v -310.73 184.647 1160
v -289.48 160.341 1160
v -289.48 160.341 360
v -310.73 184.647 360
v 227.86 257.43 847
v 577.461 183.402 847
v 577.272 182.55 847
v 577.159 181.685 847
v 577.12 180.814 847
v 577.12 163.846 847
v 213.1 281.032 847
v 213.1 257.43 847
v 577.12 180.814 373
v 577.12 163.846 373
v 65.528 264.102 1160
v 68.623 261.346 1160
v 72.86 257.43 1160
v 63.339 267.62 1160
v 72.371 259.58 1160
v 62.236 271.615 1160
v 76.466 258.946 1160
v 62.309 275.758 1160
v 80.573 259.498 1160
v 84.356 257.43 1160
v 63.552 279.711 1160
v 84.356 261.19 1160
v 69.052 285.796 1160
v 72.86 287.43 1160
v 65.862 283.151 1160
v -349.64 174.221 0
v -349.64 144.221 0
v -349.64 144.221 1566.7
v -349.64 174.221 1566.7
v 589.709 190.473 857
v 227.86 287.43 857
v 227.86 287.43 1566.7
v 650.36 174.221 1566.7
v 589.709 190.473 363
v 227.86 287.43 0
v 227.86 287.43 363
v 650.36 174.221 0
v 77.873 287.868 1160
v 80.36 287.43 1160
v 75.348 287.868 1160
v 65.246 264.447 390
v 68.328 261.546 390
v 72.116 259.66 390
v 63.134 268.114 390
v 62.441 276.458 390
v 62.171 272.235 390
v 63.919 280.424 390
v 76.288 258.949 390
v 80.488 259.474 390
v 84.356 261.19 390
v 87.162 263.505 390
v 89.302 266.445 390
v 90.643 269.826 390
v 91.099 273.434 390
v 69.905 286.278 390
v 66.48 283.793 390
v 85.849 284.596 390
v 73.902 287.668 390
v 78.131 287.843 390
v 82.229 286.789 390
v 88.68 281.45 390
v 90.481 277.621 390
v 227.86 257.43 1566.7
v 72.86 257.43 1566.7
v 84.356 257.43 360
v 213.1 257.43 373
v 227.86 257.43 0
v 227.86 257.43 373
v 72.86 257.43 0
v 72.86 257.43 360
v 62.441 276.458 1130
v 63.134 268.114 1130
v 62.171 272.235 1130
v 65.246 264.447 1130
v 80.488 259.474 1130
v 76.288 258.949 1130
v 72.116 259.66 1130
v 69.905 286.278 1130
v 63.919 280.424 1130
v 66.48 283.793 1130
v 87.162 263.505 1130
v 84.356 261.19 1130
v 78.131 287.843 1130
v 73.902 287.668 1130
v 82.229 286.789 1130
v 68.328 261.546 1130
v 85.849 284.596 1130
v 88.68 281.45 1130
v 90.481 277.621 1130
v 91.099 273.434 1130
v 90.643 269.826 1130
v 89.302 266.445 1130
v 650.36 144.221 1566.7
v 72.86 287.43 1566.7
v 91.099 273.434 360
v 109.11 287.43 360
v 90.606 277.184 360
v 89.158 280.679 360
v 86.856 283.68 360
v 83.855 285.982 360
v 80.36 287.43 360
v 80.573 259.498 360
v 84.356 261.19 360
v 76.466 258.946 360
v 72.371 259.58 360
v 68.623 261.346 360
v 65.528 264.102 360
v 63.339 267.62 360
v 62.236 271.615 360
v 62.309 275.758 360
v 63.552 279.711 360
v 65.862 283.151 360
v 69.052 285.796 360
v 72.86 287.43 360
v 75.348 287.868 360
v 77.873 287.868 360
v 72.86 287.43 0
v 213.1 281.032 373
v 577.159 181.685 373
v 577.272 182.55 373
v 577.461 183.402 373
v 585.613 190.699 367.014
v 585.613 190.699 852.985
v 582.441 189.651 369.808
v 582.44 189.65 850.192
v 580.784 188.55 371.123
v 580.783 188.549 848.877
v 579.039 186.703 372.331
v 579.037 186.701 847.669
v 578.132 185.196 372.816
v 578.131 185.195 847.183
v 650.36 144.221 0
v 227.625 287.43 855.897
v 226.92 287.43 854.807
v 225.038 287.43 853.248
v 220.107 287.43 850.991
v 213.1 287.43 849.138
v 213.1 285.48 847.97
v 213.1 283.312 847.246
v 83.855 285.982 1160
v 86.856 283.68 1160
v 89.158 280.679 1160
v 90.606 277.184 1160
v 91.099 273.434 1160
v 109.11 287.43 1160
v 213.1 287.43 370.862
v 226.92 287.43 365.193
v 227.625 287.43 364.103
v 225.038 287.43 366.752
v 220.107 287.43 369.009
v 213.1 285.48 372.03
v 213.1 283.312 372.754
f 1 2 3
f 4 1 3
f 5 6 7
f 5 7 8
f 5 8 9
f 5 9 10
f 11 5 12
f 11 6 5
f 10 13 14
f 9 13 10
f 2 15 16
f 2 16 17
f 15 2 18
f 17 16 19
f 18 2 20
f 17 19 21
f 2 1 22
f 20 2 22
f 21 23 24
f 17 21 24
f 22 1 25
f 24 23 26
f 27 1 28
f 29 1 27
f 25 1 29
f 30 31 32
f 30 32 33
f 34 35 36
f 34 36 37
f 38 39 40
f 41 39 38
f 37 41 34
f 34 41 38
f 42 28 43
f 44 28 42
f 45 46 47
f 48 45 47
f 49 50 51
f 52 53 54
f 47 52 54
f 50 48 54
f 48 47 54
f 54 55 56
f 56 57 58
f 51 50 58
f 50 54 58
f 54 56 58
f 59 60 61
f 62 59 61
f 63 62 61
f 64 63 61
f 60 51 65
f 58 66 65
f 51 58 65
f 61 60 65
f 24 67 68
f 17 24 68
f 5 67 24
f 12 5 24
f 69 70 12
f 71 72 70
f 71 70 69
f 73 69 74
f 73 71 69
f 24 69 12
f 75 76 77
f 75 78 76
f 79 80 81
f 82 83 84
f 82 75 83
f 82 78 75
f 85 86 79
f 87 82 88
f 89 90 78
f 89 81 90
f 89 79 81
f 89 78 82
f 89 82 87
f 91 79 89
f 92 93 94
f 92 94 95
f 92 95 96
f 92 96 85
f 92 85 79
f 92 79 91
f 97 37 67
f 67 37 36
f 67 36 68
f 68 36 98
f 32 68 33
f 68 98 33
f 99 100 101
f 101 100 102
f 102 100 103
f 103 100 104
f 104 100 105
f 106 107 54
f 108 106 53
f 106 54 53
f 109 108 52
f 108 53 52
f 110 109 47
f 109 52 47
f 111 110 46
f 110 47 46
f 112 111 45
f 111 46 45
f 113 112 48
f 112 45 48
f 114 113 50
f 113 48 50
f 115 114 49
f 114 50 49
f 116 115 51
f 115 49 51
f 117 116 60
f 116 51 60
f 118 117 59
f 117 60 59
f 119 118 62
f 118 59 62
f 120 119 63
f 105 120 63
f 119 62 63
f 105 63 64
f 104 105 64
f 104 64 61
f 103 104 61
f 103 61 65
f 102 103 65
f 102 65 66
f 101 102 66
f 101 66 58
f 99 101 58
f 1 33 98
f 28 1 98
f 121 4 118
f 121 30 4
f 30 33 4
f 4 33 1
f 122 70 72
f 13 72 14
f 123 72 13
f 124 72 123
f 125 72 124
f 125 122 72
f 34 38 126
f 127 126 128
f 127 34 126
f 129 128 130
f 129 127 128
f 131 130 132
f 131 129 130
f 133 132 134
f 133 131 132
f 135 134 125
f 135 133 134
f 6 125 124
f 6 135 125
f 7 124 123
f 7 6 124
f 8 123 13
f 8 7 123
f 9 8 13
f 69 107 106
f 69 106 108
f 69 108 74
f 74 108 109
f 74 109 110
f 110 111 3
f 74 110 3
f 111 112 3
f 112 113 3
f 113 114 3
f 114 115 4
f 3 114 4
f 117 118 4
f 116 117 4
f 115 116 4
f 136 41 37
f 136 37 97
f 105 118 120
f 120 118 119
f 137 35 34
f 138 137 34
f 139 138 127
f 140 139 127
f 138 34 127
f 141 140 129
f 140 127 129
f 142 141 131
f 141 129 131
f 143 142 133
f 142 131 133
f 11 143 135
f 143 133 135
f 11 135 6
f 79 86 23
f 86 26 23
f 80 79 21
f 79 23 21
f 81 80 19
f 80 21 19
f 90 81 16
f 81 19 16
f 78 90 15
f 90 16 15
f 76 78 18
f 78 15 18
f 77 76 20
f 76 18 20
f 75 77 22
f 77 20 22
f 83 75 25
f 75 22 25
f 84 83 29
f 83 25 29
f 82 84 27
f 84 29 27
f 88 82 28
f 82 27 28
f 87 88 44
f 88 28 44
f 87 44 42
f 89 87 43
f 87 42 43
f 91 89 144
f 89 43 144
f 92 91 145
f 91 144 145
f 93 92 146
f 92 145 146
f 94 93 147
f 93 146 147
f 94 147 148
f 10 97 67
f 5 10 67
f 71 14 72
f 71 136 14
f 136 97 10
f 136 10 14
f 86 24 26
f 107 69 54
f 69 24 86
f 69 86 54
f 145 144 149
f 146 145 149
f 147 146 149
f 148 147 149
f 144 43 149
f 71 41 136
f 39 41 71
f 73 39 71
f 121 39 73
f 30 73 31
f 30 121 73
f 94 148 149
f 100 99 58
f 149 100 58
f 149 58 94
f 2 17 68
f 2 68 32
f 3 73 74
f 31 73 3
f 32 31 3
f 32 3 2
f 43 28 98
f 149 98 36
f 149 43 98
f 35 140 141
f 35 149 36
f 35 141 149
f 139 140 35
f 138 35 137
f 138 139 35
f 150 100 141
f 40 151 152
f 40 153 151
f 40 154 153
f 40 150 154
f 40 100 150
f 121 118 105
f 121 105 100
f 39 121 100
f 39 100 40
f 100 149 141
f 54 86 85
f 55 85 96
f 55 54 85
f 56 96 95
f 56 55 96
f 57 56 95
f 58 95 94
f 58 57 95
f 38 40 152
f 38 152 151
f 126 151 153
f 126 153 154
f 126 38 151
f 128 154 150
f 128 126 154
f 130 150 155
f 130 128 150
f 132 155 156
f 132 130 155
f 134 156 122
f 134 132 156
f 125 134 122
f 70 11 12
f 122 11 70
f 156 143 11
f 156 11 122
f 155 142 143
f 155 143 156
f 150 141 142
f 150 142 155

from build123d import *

# Parameters (mm, degrees)
AUFSATZ_LINEAR_AUSTRAGEN1_DEPTH = 1566.7
SCHNITT_LINEAR_AUSTRAGEN1_REACH = 1704.359
FASE1_SIZE2                     = 30
FASE1_SIZE                      = 22
VERRUNDUNG1_R                   = 10
SKIZZE4_R                       = 14.488887394336269
AUFSATZ_LINEAR_AUSTRAGEN3_DEPTH = 30
AUFSATZ_LINEAR_AUSTRAGEN7_REACH = 1402.712
LINEARES_MUSTER2_COUNT          = 2
LINEARES_MUSTER2_PITCH          = 770.0000000000005


with BuildPart() as part:
    # Skizze1 → Aufsatz-Linear austragen1 (new body)
    with BuildSketch(Plane.XY):
        Polygon((650.3604764885325, 174.22108378429925), (650.3604764885325, 144.22108378429925), (227.86047648853256, 257.42961758644554), (72.86047648853256, 257.42961758644554), (-349.6395235114674, 144.22108378429914), (-349.6395235114674, 174.2210837842995), (72.86047648853253, 287.42961758644606), (227.8604764885318, 287.42961758644606), align=None)
    extrude(amount=AUFSATZ_LINEAR_AUSTRAGEN1_DEPTH)

    # Skizze2 → Schnitt-Linear austragen1 (cut, up to next)
    with BuildSketch(Plane(origin=(0, 287.42961758644606, 0), x_dir=(1, 0, 0), z_dir=(0, 1, 0)), mode=Mode.PRIVATE) as schnitt_linear_austragen1_sk1:
        Polygon((145.36047648853253, -360), (-289.47952351146745, -360.00000000000006), (-289.47952351146733, -1160.0000000000002), (145.36047648853264, -1160.0000000000005), align=None)
    schnitt_linear_austragen1_tool1 = extrude(schnitt_linear_austragen1_sk1.sketch, amount=-SCHNITT_LINEAR_AUSTRAGEN1_REACH, mode=Mode.PRIVATE) & part.part
    # Skizze2 → Schnitt-Linear austragen1 (cut, up to next)
    with BuildSketch(Plane(origin=(0, 287.42961758644606, 0), x_dir=(1, 0, 0), z_dir=(0, 1, 0)), mode=Mode.PRIVATE) as schnitt_linear_austragen1_sk2:
        Polygon((213.10047648853242, -373), (577.1204764885325, -372.99999999999994), (577.1204764885326, -847), (213.10047648853248, -847.0000000000001), align=None)
    schnitt_linear_austragen1_tool2 = extrude(schnitt_linear_austragen1_sk2.sketch, amount=-SCHNITT_LINEAR_AUSTRAGEN1_REACH, mode=Mode.PRIVATE) & part.part
    add(schnitt_linear_austragen1_tool1.solids().sort_by_distance((-72.059524, 287.429618, 760))[0], mode=Mode.SUBTRACT)
    add(schnitt_linear_austragen1_tool2.solids().sort_by_distance((395.110476, 287.429618, 610))[0], mode=Mode.SUBTRACT)

    # Fase1
    fase1_edges = [part.edges().sort_by_distance(p)[0] for p in [
        (-289.47952351146745, 190.34090720095548, 760.0000000000001),
    ]]
    fase1_side = [part.faces().sort_by_distance(p)[0] for p in [
        (-289.90453087503465, 190.22702682111037, 760.0000000000001),
    ]]
    chamfer(fase1_edges, length=FASE1_SIZE - 0.0001, length2=FASE1_SIZE2 - 0.0001, reference=fase1_side[0])  # a hair under: the kernel refuses the full size

    # Verrundung1
    verrundung1_edges = [part.edges().sort_by_distance(p)[0] for p in [
        (402.49047648853224, 240.6376501122001, 847),
    ]]
    fillet(verrundung1_edges, radius=VERRUNDUNG1_R)
    verrundung1_2_edges = [part.edges().sort_by_distance(p)[0] for p in [
        (577.1204764885325, 193.84568263795418, 610),
    ]]
    fillet(verrundung1_2_edges, radius=VERRUNDUNG1_R - 0.0001)  # a hair under: the kernel refuses the full size
    verrundung1_3_edges = [part.edges().sort_by_distance(p)[0] for p in [
        (402.4904764885322, 240.6376501122001, 373),
    ]]
    fillet(verrundung1_3_edges, radius=VERRUNDUNG1_R)

    # Skizze4 → Aufsatz-Linear austragen3 (add)
    with BuildSketch(Plane(origin=(-5.9234e-13, 0, 1160.0000000000005), x_dir=(-1, 0, -5.1e-16), z_dir=(5.1e-16, 0, -1))):
        with Locations(Location((-76.61047648853322, 273.43442705806245, 0), (0, 0, 105))):
            Circle(SKIZZE4_R)
    aufsatz_linear_austragen3 = extrude(amount=AUFSATZ_LINEAR_AUSTRAGEN3_DEPTH)

    # Aufsatz-Linear austragen7: up to this face of the body (flat: up to its plane)
    aufsatz_linear_austragen7_end = Plane(part.part.faces().sort_by_distance((-85.378398687, 228.495263502, 1160))[0])
    # Skizze6 → Aufsatz-Linear austragen7 (add, up to the picked face)
    with BuildSketch(Plane.XY.offset(360), mode=Mode.PRIVATE) as aufsatz_linear_austragen7_sk1:
        with BuildLine():
            Line((145.36047648853247, 287.42961758644606), (145.36047648853247, 257.42961758644554))
            Line((145.36047648853247, 257.42961758644554), (84.35616614086427, 257.42961758644554))
            Line((84.35616614086427, 257.42961758644554), (84.35616614086427, 261.189748632905))
            ThreePointArc((84.35616614086427, 261.189748632905), (89.30209346766217, 266.44509830768715), (91.09936388286874, 273.43442705806245))
            Line((91.09936388286874, 273.43442705806245), (109.11047648853247, 287.42961758644606))
            Line((109.11047648853247, 287.42961758644606), (145.36047648853247, 287.42961758644606))
        make_face()
    aufsatz_linear_austragen7_tool1 = split(extrude(aufsatz_linear_austragen7_sk1.sketch, amount=AUFSATZ_LINEAR_AUSTRAGEN7_REACH, mode=Mode.PRIVATE), bisect_by=aufsatz_linear_austragen7_end, keep=Keep.BOTH, mode=Mode.PRIVATE)
    add(aufsatz_linear_austragen7_tool1.solids().sort_by(Axis((118.992611, 271.244941, 360), (0, 0, 1)))[0])

    # Lineares Muster2: Aufsatz-Linear austragen3 ×2
    with Locations(*[(0, 0, -i * LINEARES_MUSTER2_PITCH) for i in range(1, LINEARES_MUSTER2_COUNT)]):
        add(aufsatz_linear_austragen3)


solid = part.part
